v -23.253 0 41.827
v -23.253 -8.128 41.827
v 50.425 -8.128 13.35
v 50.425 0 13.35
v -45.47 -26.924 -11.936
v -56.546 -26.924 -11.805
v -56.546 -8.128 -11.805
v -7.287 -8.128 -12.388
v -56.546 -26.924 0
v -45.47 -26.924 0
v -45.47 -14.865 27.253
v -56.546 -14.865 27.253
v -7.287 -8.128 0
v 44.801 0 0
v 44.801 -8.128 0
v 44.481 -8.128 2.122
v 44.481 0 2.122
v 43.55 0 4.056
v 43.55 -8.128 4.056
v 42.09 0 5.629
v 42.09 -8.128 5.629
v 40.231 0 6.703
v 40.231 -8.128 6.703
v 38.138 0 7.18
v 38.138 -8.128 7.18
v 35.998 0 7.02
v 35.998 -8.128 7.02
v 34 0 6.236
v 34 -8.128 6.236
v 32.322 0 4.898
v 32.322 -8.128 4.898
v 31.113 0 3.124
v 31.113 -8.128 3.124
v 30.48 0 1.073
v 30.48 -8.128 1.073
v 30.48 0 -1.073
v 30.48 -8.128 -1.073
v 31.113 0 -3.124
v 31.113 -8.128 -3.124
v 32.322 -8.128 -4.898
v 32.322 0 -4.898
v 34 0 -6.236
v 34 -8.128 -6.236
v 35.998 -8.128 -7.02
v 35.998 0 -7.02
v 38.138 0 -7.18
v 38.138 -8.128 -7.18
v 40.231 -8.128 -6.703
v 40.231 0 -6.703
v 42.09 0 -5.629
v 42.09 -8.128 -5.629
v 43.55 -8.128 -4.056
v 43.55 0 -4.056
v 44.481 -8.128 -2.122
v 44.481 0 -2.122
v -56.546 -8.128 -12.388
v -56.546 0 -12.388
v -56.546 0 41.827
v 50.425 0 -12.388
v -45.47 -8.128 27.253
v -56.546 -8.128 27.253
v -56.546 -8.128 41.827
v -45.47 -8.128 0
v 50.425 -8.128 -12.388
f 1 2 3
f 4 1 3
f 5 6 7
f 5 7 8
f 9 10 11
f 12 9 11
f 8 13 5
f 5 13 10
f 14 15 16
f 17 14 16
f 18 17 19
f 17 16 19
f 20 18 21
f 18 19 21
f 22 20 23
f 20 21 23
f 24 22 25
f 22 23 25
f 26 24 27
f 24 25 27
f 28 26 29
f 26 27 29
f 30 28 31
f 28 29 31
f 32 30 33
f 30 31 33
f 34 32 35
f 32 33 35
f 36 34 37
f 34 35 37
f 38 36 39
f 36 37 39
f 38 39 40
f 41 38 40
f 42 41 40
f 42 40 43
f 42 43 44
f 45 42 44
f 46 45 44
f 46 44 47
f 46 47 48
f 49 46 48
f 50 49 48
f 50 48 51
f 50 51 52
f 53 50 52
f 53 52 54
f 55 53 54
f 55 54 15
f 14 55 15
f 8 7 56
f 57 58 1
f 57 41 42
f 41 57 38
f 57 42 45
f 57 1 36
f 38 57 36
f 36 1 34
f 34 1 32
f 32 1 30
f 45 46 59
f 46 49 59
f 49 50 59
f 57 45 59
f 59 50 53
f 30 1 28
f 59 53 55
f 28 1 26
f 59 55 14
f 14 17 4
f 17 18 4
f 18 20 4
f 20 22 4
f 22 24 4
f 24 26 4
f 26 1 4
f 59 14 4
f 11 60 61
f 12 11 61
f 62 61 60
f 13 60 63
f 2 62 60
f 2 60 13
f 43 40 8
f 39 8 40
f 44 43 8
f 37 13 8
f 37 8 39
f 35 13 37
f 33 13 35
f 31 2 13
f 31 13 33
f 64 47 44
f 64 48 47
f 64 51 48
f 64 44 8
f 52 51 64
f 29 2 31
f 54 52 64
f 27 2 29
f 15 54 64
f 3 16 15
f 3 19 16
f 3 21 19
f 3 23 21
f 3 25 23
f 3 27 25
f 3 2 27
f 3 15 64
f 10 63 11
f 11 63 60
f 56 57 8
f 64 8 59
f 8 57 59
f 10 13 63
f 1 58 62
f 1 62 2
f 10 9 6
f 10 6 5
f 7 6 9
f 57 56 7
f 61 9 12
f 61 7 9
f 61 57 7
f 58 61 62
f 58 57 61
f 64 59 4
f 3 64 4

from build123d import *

# Parameters (mm, degrees)
F0_W      = 106.971476227
F0_H      = 54.2144235224
F1_DEPTH  = 8.128
F3_DEPTH  = 25.4
F4_R      = 7.2003845792
F5_DEPTH  = 25.4
F7_DEPTH  = 18.796
F9_DEPTH  = 25.4
F11_DEPTH = 25.4


with BuildPart() as f1:
    # F0 (on Front) → F1 (new body)
    with BuildSketch(Plane.XZ):
        with Locations((-3.0604917556, 14.7195057943)):
            Rectangle(F0_W, F0_H)
    extrude(amount=F1_DEPTH)

    # F2 (on face) → F3 (cut)
    with BuildSketch(Plane.XZ.offset(8.128)):
        Polygon((50.4252463579, 41.8267175555), (-23.2532570529, 41.8267175555), (50.4252463579, 13.3497529124), align=None)
    extrude(amount=-F3_DEPTH, mode=Mode.SUBTRACT)

    # F4 (on face) → F5 (cut)
    with BuildSketch(Plane.XZ.offset(8.128)):
        with Locations((37.6003310084, 0)):
            Circle(F4_R)
    extrude(amount=-F5_DEPTH, mode=Mode.SUBTRACT)

    # F6 (on face) → F7 (join)
    with BuildSketch(Plane.XZ.offset(8.128)):
        Polygon((-45.4701632261, 27.2529497743), (-56.5462298691, 27.2529497743), (-56.5462298691, -11.8047548458), (-7.286884822, -12.3877059668), (-7.286884822, 0), (-45.4701632261, 0), align=None)
    extrude(amount=F7_DEPTH)

    # F8 (on face) → F9 (cut)
    with BuildSketch(Plane.XY):
        Polygon((-7.286884822, -8.128), (-45.4701632261, -26.924), (-7.286884822, -26.924), align=None)
    extrude(amount=-F9_DEPTH, mode=Mode.SUBTRACT)

    # F10 (on face) → F11 (cut)
    with BuildSketch(Plane.YZ.offset(-45.4701632261)):
        Polygon((-26.924, 27.2529497743), (-26.924, 0), (-14.8652466014, 27.2529497743), align=None)
    extrude(amount=-F11_DEPTH, mode=Mode.SUBTRACT)


solid = f1.part
